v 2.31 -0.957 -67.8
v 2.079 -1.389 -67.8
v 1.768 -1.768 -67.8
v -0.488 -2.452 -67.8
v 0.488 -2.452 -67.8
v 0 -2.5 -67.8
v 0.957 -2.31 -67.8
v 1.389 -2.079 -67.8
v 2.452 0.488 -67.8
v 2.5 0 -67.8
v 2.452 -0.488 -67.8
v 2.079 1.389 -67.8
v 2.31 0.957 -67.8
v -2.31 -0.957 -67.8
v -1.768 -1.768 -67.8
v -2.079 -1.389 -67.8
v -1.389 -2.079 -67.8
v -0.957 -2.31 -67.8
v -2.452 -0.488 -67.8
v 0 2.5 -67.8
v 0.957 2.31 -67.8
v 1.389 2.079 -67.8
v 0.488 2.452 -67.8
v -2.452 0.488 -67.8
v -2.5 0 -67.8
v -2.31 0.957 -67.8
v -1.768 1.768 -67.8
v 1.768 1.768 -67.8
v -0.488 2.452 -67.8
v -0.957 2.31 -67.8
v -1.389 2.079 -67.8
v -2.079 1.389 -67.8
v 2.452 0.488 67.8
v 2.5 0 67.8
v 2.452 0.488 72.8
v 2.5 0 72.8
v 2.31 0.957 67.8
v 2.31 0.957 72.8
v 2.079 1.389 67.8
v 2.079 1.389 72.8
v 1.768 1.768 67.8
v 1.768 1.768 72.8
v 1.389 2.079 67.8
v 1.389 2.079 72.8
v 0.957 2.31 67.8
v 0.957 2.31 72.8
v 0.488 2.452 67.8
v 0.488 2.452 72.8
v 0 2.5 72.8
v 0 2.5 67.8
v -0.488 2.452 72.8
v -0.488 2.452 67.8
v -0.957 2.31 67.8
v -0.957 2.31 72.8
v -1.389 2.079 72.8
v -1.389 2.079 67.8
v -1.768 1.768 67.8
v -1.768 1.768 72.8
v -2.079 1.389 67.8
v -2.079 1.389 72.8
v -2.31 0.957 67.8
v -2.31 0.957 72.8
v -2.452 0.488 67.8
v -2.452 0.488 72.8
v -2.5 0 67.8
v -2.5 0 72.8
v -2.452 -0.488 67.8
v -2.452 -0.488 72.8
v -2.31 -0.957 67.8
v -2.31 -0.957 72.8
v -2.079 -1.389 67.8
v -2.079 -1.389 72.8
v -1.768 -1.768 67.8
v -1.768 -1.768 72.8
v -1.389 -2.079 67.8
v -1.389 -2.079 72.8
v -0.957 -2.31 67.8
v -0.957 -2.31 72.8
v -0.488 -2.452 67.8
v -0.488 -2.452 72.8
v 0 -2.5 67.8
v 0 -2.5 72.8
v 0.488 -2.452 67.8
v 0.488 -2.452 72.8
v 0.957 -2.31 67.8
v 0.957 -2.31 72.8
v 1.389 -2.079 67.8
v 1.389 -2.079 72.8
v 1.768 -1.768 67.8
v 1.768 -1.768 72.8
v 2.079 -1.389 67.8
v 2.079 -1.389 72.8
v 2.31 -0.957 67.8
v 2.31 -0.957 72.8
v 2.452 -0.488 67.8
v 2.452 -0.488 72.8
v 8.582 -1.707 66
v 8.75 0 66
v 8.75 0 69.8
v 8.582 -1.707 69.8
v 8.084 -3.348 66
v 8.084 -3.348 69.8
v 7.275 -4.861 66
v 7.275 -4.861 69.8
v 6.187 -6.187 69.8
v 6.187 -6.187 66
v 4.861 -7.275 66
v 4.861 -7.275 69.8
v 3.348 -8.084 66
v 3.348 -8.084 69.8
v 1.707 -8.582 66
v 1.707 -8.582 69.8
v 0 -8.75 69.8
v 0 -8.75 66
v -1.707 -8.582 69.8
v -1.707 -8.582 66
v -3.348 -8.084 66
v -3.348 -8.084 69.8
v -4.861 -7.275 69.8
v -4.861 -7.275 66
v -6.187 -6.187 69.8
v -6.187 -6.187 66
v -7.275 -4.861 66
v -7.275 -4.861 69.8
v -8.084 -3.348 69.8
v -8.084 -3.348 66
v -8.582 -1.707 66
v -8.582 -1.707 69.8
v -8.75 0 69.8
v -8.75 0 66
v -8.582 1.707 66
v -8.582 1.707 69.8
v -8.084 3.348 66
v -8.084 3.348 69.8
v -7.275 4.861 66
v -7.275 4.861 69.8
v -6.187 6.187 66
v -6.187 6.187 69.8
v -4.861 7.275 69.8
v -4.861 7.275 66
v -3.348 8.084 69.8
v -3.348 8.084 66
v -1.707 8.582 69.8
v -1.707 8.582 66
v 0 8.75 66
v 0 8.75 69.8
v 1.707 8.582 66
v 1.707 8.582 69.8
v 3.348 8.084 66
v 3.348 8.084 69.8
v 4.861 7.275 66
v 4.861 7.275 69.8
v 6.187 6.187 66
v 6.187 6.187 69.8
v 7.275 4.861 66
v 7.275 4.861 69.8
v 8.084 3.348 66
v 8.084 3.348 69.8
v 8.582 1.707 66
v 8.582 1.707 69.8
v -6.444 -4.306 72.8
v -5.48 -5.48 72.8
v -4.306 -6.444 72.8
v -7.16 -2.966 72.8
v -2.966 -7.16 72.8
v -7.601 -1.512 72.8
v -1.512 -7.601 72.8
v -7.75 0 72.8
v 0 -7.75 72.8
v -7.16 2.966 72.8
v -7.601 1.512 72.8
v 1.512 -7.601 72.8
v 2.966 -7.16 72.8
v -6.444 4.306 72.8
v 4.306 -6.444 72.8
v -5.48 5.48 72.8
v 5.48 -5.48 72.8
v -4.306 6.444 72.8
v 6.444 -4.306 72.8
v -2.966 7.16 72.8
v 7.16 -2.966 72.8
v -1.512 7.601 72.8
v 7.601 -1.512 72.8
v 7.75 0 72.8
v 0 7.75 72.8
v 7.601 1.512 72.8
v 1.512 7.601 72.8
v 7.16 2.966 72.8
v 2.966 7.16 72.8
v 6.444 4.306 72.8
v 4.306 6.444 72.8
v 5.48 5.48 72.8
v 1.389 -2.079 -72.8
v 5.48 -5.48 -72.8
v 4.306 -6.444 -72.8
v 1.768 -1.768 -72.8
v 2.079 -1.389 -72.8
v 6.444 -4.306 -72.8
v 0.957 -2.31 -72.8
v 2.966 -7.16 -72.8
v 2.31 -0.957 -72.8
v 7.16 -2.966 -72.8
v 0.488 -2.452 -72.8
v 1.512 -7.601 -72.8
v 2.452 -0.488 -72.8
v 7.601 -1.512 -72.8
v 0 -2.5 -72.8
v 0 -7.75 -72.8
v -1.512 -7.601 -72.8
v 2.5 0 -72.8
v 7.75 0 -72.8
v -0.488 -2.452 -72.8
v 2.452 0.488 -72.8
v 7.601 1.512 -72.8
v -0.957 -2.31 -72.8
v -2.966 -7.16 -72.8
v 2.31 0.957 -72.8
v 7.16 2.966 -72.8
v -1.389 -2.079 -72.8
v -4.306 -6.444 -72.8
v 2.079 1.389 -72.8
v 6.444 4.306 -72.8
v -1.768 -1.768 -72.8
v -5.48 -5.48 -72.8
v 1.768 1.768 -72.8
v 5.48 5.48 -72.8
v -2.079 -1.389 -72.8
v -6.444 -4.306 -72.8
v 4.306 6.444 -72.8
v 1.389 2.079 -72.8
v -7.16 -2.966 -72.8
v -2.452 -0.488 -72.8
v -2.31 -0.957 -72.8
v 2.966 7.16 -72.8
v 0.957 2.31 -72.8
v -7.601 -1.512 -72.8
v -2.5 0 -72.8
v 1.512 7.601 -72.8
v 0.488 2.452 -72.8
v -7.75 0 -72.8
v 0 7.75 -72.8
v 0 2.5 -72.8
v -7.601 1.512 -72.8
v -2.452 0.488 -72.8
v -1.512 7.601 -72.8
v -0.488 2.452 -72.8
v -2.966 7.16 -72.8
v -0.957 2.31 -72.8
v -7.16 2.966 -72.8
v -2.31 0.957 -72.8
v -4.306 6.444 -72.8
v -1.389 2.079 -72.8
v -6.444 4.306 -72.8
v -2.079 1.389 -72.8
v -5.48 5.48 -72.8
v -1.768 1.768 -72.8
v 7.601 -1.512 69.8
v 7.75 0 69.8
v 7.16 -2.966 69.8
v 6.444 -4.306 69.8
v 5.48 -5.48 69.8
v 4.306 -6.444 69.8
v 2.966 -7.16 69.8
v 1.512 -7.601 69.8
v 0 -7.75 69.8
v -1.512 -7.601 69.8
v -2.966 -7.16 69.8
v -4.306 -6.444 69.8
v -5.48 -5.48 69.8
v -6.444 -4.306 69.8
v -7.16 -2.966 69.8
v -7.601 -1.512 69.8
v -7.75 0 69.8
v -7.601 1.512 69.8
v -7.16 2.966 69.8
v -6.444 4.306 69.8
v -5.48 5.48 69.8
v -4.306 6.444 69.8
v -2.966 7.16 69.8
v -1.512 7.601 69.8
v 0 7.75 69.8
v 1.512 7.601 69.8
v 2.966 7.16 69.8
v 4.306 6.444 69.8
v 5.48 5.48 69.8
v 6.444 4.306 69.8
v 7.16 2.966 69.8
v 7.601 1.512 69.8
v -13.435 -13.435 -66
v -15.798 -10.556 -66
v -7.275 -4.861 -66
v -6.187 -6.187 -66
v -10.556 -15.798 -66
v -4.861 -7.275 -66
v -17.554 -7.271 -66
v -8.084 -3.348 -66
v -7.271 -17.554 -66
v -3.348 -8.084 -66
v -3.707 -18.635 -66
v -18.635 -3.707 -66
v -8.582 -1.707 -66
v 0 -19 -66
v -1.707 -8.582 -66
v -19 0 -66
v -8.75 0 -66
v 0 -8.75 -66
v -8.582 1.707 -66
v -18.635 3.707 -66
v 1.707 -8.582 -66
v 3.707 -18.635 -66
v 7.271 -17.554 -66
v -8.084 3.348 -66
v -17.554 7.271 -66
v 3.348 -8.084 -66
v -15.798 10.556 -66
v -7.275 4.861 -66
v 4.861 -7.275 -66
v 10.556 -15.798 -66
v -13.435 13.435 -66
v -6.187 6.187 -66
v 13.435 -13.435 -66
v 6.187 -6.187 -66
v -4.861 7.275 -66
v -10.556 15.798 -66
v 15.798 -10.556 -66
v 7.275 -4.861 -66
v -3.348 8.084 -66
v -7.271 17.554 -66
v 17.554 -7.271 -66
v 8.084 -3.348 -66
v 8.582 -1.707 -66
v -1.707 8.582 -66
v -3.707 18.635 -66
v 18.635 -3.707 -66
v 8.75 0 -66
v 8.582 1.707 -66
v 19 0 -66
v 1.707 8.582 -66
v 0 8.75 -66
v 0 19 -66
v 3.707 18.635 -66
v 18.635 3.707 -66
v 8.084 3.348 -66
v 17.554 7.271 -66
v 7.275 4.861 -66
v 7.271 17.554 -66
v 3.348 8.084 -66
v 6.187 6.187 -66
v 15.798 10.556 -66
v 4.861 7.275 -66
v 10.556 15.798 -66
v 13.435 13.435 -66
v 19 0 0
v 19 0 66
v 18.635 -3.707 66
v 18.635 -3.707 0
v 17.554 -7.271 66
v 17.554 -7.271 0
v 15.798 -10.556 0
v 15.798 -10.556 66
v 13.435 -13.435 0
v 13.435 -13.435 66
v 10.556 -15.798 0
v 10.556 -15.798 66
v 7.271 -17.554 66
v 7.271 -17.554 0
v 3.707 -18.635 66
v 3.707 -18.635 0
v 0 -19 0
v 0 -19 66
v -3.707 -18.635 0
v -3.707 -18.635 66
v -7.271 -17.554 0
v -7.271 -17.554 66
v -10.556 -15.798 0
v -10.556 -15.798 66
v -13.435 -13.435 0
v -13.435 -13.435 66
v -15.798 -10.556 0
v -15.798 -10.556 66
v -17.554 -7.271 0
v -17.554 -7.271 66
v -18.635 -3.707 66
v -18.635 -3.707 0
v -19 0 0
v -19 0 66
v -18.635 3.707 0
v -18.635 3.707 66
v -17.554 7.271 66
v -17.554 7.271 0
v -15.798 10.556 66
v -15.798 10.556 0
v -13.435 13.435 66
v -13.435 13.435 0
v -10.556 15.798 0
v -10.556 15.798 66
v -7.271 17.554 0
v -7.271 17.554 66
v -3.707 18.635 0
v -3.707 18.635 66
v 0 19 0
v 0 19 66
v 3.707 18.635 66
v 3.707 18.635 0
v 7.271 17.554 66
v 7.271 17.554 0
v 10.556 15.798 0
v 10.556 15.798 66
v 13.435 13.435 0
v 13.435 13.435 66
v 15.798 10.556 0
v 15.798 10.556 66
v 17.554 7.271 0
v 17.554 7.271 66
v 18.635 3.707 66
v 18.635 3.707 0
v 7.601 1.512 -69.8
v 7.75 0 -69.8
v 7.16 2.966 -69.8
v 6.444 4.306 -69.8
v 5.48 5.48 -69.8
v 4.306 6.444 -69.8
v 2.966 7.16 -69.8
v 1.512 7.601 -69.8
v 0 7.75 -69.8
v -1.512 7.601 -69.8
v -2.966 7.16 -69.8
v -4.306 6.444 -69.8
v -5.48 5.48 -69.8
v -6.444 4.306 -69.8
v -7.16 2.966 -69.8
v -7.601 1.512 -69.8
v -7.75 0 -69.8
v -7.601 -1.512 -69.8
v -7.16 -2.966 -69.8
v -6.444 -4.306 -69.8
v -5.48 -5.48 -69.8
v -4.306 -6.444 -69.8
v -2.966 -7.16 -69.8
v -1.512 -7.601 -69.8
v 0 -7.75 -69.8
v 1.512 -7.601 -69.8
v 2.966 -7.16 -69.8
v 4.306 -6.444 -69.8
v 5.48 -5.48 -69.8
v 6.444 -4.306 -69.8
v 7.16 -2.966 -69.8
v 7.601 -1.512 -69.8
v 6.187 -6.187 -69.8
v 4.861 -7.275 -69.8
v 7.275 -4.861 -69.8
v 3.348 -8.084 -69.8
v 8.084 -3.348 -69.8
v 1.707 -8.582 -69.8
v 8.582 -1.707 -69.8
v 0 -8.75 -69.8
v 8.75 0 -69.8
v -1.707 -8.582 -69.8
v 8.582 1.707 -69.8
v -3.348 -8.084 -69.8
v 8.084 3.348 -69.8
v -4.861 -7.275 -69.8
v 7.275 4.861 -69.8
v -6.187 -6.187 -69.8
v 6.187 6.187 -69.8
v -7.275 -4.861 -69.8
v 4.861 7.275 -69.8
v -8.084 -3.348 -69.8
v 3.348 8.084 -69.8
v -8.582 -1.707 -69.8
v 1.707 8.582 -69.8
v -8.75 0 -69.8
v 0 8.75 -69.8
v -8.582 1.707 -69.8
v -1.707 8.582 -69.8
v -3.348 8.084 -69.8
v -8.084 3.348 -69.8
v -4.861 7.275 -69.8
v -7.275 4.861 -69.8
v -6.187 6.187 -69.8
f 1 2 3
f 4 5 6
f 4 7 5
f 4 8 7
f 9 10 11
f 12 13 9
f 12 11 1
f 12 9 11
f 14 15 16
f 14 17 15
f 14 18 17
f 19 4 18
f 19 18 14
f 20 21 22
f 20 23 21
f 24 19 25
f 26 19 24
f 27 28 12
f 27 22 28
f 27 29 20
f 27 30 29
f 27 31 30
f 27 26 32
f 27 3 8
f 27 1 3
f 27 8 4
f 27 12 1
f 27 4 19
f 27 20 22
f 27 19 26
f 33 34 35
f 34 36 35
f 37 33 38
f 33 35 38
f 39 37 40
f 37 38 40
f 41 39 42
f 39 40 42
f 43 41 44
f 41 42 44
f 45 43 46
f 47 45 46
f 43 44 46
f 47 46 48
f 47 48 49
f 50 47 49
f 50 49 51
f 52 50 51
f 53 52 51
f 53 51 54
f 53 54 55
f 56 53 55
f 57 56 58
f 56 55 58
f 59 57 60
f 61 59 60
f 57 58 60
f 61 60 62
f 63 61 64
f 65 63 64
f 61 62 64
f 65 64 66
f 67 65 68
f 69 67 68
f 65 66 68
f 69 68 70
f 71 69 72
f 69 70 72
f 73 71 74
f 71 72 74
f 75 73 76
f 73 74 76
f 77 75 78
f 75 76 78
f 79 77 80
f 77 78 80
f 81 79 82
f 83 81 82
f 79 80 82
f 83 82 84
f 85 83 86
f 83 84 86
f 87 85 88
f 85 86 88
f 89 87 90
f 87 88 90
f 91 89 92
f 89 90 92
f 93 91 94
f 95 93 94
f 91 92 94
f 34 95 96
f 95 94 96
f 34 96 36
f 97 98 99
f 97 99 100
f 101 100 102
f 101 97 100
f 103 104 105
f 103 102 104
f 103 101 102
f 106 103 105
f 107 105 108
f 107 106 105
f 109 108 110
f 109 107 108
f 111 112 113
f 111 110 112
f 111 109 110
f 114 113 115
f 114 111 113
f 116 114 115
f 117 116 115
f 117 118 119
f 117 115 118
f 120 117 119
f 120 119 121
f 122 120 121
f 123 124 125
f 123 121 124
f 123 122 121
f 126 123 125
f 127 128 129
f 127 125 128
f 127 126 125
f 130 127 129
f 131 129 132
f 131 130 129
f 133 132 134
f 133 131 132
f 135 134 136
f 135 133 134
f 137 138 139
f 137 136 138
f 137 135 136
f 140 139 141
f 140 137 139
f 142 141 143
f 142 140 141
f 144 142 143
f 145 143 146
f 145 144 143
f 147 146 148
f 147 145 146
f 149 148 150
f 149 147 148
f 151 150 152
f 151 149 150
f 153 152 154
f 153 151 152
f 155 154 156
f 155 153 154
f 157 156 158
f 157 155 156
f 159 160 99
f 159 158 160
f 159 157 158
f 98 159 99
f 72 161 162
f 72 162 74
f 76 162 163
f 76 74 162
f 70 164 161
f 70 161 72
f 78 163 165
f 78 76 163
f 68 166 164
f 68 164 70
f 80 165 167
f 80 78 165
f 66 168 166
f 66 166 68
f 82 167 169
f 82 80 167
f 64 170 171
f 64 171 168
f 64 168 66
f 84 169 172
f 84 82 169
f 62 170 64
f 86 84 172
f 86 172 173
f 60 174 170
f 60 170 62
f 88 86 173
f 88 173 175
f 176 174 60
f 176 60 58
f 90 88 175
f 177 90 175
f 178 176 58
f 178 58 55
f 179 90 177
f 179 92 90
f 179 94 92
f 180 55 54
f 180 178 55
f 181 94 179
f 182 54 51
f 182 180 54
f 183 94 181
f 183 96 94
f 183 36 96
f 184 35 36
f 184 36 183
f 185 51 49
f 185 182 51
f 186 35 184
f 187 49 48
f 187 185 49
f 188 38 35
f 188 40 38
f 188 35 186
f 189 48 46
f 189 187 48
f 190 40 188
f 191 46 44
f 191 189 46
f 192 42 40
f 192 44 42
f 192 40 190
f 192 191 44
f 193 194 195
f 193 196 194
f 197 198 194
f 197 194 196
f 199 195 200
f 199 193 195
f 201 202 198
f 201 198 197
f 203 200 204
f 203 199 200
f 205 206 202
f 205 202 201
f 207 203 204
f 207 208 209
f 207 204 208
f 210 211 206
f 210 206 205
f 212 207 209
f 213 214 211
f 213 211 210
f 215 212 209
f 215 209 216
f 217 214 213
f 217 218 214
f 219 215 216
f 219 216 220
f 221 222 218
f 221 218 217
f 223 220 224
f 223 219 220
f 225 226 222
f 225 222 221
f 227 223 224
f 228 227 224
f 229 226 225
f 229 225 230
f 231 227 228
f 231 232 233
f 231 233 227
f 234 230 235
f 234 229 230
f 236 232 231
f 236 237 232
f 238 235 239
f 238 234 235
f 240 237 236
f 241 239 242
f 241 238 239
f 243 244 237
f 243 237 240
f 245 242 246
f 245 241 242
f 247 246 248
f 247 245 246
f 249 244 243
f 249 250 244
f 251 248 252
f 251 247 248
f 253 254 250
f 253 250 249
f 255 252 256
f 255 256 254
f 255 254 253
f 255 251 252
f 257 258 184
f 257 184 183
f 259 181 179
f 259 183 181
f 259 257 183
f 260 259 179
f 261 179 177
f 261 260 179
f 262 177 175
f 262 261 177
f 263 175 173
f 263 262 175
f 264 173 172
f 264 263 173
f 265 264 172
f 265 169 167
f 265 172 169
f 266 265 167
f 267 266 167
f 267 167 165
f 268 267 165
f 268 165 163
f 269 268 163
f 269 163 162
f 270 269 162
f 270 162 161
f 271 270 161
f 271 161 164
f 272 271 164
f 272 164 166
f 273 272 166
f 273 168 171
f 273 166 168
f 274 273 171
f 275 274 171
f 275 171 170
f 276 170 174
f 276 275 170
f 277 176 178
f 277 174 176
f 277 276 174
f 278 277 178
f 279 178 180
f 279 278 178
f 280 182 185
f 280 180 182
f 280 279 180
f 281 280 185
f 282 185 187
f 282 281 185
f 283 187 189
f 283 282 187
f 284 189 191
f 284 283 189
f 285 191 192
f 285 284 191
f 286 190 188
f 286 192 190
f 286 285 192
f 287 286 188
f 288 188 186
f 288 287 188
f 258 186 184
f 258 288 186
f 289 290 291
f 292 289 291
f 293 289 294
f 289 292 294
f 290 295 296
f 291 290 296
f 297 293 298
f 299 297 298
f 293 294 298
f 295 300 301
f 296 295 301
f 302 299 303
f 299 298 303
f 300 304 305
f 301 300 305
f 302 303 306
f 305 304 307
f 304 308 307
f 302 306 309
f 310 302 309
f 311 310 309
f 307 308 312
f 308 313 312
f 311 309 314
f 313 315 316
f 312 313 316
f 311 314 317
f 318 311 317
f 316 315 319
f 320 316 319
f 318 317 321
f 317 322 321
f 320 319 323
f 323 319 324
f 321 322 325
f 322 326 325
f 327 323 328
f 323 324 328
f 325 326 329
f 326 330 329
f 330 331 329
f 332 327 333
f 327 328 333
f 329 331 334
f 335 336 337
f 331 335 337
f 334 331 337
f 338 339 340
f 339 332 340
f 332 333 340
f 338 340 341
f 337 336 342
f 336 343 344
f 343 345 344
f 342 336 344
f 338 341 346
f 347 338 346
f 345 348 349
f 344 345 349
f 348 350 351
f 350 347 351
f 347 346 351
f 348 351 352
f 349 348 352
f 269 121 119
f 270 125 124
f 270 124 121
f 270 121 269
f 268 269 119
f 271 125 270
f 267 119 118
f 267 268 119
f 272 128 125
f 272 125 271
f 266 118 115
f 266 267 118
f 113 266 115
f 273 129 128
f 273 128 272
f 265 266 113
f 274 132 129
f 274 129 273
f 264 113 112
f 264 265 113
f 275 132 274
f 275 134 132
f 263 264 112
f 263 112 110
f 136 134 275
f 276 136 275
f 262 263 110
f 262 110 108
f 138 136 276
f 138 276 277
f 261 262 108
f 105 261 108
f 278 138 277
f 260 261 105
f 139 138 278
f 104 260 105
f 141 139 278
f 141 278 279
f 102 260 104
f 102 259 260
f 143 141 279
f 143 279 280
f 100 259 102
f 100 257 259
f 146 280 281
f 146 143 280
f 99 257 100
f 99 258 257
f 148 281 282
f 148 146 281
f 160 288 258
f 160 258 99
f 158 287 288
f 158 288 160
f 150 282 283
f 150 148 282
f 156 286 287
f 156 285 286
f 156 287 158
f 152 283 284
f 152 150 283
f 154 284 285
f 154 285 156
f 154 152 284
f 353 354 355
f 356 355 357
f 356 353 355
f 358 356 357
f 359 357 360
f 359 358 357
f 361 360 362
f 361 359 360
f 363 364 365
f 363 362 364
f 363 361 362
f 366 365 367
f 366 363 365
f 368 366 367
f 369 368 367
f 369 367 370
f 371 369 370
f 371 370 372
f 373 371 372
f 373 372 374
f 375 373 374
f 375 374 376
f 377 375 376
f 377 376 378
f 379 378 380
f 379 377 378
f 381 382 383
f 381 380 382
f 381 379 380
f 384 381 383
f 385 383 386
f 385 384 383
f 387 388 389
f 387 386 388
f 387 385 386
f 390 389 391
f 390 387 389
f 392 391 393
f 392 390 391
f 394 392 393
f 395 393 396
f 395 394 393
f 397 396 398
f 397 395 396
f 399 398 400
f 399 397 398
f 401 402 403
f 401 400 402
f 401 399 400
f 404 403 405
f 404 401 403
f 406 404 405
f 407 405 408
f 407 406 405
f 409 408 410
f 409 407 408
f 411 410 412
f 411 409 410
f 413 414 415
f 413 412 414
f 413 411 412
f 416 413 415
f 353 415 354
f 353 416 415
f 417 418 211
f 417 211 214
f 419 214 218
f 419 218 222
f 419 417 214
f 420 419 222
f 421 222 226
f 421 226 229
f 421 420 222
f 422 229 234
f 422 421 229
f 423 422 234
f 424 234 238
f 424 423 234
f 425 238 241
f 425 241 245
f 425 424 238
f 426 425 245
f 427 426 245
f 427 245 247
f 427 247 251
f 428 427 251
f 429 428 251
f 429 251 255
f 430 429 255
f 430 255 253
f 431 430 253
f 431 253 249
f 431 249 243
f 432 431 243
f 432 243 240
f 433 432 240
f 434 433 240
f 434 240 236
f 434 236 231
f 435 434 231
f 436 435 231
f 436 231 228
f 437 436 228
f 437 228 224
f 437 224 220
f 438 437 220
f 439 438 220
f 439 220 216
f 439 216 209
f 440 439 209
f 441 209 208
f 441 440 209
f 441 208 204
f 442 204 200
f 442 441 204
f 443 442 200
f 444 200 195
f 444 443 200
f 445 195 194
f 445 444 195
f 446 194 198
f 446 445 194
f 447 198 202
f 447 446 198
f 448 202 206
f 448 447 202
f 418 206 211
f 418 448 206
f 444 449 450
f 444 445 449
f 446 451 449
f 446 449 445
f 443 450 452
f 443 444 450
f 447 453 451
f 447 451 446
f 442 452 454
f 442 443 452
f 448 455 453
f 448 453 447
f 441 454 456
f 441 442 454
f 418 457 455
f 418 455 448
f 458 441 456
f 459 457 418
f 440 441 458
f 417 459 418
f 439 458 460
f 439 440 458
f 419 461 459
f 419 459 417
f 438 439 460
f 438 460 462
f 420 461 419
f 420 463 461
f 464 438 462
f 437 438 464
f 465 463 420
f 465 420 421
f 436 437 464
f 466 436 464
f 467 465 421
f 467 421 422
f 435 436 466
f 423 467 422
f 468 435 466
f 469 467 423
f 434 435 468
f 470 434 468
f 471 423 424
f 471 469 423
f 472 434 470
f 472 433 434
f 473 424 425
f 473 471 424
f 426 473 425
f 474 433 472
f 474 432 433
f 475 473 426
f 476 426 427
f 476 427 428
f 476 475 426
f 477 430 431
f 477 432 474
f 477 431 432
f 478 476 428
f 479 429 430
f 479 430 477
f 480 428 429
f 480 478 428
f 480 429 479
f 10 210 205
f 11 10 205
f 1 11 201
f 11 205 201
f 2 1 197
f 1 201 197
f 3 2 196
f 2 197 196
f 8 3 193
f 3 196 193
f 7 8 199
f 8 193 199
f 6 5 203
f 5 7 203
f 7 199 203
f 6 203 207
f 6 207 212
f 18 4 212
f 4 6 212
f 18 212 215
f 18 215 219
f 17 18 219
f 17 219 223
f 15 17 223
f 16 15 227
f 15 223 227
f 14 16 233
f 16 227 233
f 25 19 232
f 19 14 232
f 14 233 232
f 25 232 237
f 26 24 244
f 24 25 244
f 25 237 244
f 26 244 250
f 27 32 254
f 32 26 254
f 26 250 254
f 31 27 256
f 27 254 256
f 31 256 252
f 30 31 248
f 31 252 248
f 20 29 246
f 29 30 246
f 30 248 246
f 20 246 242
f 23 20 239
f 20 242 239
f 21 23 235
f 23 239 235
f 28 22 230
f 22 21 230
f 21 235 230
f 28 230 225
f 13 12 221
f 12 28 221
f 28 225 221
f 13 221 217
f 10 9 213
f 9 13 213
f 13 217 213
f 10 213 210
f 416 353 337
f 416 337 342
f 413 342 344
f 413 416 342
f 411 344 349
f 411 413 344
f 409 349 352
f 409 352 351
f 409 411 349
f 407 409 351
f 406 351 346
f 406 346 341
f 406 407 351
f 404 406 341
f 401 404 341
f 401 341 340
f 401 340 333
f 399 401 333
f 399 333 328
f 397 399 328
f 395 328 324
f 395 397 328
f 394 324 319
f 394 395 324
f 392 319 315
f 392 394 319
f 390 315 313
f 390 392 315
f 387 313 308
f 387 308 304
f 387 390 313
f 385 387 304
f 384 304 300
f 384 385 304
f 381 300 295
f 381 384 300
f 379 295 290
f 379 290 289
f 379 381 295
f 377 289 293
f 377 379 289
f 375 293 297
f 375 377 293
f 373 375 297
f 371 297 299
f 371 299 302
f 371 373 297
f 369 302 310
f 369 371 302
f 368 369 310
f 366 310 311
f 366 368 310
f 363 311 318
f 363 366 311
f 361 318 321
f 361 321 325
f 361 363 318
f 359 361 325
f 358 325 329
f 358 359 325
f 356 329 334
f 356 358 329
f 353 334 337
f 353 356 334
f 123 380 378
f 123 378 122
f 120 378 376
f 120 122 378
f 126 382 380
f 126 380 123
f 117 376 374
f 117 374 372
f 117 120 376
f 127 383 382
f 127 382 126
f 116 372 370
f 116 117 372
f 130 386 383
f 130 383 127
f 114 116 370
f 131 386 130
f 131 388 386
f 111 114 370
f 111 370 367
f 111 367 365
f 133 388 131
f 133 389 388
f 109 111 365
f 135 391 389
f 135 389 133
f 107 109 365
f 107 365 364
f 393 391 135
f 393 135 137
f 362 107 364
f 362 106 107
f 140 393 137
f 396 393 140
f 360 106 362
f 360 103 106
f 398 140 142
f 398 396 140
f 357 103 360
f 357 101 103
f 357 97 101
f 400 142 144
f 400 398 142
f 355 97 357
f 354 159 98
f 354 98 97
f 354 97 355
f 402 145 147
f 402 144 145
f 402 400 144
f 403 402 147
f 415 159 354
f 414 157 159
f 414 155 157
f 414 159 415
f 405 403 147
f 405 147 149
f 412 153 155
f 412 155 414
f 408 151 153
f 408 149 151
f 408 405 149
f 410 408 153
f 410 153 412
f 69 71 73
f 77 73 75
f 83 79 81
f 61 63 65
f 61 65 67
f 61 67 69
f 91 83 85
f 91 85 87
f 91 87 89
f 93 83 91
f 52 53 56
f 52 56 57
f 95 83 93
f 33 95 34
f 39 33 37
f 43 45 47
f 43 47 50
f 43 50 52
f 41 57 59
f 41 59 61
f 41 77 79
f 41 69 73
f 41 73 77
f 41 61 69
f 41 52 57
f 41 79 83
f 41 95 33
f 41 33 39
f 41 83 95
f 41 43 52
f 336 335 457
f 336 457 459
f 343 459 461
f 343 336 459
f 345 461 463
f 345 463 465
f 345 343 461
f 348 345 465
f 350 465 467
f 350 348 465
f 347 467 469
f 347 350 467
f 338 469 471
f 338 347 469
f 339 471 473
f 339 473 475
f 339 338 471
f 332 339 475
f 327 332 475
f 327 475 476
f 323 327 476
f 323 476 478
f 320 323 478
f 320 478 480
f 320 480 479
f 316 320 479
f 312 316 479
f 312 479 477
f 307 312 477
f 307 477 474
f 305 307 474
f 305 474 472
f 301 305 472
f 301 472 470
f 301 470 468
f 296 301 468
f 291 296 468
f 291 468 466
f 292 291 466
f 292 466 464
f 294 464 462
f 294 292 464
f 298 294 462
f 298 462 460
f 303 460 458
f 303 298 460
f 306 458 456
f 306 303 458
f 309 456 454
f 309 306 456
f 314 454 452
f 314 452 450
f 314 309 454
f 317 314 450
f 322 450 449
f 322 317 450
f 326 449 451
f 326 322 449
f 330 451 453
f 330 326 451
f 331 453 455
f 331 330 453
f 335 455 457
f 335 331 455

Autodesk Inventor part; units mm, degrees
ref_plane "YZ Plane" through (0, 0, 0) normal (1, 0, 0) x (0, 1, 0)
ref_plane "XZ Plane" through (0, 0, 0) normal (0, 1, 0) x (-1, 0, 0)
ref_plane "XY Plane" through (0, 0, 0) normal (0, 0, 1) x (1, 0, 0)
sketch "Sketch1" plane through (0, 0, 0) normal (0, 0, 1) x (1, 0, 0)
  circle A0 centre (0, 0) radius 19
  dimension "d0" = 38
extrude "Base_Shell" add sketch "Sketch1" along normal mid plane 132
sketch "Sketch2" plane through (0, 0, 66) normal (0, 0, 1) x (1, 0, 0)
  circle A0 centre (0, 0) radius 8.75
  dimension "d3" = 17.5
extrude "Terminal_Shell" add sketch "Sketch2" along normal blind 3.8
sketch "Sketch3" plane through (0, 0, 69.8) normal (0, 0, 1) x (1, 0, 0)
  circle A0 centre (0, 0) radius 7.75
  dimension "d6" = 15.5
extrude "Terminal" add sketch "Sketch3" along normal blind 3
sketch "Sketch4" plane through (0, 0, 72.8) normal (0, 0, 1) x (1, 0, 0)
  circle A0 centre (0, 0) radius 2.5
  dimension "d9" = 5
extrude "M5_Terminal_Screw_hole" cut sketch "Sketch4" against normal blind 5
mirror "Mirror1" about plane through (0, 0, 0) normal (0, 0, 1) of "Terminal_Shell", "Terminal", "M5_Terminal_Screw_hole"
equation "\"d1\" = 3.47368 * d0"
equation "\"d3\" = 0.460526 * d0"
equation "\"d4\" = 0.1 * d0"
equation "\"d6\" = 0.407895 * d0"
equation "\"d7\" = 0.0789474 * d0"
equation "\"d9\" = 0.131579 * d0"
equation "\"d10\" = d9"
properties part number "38120s-10Ah" material "Nickel-Copper Alloy 400"
